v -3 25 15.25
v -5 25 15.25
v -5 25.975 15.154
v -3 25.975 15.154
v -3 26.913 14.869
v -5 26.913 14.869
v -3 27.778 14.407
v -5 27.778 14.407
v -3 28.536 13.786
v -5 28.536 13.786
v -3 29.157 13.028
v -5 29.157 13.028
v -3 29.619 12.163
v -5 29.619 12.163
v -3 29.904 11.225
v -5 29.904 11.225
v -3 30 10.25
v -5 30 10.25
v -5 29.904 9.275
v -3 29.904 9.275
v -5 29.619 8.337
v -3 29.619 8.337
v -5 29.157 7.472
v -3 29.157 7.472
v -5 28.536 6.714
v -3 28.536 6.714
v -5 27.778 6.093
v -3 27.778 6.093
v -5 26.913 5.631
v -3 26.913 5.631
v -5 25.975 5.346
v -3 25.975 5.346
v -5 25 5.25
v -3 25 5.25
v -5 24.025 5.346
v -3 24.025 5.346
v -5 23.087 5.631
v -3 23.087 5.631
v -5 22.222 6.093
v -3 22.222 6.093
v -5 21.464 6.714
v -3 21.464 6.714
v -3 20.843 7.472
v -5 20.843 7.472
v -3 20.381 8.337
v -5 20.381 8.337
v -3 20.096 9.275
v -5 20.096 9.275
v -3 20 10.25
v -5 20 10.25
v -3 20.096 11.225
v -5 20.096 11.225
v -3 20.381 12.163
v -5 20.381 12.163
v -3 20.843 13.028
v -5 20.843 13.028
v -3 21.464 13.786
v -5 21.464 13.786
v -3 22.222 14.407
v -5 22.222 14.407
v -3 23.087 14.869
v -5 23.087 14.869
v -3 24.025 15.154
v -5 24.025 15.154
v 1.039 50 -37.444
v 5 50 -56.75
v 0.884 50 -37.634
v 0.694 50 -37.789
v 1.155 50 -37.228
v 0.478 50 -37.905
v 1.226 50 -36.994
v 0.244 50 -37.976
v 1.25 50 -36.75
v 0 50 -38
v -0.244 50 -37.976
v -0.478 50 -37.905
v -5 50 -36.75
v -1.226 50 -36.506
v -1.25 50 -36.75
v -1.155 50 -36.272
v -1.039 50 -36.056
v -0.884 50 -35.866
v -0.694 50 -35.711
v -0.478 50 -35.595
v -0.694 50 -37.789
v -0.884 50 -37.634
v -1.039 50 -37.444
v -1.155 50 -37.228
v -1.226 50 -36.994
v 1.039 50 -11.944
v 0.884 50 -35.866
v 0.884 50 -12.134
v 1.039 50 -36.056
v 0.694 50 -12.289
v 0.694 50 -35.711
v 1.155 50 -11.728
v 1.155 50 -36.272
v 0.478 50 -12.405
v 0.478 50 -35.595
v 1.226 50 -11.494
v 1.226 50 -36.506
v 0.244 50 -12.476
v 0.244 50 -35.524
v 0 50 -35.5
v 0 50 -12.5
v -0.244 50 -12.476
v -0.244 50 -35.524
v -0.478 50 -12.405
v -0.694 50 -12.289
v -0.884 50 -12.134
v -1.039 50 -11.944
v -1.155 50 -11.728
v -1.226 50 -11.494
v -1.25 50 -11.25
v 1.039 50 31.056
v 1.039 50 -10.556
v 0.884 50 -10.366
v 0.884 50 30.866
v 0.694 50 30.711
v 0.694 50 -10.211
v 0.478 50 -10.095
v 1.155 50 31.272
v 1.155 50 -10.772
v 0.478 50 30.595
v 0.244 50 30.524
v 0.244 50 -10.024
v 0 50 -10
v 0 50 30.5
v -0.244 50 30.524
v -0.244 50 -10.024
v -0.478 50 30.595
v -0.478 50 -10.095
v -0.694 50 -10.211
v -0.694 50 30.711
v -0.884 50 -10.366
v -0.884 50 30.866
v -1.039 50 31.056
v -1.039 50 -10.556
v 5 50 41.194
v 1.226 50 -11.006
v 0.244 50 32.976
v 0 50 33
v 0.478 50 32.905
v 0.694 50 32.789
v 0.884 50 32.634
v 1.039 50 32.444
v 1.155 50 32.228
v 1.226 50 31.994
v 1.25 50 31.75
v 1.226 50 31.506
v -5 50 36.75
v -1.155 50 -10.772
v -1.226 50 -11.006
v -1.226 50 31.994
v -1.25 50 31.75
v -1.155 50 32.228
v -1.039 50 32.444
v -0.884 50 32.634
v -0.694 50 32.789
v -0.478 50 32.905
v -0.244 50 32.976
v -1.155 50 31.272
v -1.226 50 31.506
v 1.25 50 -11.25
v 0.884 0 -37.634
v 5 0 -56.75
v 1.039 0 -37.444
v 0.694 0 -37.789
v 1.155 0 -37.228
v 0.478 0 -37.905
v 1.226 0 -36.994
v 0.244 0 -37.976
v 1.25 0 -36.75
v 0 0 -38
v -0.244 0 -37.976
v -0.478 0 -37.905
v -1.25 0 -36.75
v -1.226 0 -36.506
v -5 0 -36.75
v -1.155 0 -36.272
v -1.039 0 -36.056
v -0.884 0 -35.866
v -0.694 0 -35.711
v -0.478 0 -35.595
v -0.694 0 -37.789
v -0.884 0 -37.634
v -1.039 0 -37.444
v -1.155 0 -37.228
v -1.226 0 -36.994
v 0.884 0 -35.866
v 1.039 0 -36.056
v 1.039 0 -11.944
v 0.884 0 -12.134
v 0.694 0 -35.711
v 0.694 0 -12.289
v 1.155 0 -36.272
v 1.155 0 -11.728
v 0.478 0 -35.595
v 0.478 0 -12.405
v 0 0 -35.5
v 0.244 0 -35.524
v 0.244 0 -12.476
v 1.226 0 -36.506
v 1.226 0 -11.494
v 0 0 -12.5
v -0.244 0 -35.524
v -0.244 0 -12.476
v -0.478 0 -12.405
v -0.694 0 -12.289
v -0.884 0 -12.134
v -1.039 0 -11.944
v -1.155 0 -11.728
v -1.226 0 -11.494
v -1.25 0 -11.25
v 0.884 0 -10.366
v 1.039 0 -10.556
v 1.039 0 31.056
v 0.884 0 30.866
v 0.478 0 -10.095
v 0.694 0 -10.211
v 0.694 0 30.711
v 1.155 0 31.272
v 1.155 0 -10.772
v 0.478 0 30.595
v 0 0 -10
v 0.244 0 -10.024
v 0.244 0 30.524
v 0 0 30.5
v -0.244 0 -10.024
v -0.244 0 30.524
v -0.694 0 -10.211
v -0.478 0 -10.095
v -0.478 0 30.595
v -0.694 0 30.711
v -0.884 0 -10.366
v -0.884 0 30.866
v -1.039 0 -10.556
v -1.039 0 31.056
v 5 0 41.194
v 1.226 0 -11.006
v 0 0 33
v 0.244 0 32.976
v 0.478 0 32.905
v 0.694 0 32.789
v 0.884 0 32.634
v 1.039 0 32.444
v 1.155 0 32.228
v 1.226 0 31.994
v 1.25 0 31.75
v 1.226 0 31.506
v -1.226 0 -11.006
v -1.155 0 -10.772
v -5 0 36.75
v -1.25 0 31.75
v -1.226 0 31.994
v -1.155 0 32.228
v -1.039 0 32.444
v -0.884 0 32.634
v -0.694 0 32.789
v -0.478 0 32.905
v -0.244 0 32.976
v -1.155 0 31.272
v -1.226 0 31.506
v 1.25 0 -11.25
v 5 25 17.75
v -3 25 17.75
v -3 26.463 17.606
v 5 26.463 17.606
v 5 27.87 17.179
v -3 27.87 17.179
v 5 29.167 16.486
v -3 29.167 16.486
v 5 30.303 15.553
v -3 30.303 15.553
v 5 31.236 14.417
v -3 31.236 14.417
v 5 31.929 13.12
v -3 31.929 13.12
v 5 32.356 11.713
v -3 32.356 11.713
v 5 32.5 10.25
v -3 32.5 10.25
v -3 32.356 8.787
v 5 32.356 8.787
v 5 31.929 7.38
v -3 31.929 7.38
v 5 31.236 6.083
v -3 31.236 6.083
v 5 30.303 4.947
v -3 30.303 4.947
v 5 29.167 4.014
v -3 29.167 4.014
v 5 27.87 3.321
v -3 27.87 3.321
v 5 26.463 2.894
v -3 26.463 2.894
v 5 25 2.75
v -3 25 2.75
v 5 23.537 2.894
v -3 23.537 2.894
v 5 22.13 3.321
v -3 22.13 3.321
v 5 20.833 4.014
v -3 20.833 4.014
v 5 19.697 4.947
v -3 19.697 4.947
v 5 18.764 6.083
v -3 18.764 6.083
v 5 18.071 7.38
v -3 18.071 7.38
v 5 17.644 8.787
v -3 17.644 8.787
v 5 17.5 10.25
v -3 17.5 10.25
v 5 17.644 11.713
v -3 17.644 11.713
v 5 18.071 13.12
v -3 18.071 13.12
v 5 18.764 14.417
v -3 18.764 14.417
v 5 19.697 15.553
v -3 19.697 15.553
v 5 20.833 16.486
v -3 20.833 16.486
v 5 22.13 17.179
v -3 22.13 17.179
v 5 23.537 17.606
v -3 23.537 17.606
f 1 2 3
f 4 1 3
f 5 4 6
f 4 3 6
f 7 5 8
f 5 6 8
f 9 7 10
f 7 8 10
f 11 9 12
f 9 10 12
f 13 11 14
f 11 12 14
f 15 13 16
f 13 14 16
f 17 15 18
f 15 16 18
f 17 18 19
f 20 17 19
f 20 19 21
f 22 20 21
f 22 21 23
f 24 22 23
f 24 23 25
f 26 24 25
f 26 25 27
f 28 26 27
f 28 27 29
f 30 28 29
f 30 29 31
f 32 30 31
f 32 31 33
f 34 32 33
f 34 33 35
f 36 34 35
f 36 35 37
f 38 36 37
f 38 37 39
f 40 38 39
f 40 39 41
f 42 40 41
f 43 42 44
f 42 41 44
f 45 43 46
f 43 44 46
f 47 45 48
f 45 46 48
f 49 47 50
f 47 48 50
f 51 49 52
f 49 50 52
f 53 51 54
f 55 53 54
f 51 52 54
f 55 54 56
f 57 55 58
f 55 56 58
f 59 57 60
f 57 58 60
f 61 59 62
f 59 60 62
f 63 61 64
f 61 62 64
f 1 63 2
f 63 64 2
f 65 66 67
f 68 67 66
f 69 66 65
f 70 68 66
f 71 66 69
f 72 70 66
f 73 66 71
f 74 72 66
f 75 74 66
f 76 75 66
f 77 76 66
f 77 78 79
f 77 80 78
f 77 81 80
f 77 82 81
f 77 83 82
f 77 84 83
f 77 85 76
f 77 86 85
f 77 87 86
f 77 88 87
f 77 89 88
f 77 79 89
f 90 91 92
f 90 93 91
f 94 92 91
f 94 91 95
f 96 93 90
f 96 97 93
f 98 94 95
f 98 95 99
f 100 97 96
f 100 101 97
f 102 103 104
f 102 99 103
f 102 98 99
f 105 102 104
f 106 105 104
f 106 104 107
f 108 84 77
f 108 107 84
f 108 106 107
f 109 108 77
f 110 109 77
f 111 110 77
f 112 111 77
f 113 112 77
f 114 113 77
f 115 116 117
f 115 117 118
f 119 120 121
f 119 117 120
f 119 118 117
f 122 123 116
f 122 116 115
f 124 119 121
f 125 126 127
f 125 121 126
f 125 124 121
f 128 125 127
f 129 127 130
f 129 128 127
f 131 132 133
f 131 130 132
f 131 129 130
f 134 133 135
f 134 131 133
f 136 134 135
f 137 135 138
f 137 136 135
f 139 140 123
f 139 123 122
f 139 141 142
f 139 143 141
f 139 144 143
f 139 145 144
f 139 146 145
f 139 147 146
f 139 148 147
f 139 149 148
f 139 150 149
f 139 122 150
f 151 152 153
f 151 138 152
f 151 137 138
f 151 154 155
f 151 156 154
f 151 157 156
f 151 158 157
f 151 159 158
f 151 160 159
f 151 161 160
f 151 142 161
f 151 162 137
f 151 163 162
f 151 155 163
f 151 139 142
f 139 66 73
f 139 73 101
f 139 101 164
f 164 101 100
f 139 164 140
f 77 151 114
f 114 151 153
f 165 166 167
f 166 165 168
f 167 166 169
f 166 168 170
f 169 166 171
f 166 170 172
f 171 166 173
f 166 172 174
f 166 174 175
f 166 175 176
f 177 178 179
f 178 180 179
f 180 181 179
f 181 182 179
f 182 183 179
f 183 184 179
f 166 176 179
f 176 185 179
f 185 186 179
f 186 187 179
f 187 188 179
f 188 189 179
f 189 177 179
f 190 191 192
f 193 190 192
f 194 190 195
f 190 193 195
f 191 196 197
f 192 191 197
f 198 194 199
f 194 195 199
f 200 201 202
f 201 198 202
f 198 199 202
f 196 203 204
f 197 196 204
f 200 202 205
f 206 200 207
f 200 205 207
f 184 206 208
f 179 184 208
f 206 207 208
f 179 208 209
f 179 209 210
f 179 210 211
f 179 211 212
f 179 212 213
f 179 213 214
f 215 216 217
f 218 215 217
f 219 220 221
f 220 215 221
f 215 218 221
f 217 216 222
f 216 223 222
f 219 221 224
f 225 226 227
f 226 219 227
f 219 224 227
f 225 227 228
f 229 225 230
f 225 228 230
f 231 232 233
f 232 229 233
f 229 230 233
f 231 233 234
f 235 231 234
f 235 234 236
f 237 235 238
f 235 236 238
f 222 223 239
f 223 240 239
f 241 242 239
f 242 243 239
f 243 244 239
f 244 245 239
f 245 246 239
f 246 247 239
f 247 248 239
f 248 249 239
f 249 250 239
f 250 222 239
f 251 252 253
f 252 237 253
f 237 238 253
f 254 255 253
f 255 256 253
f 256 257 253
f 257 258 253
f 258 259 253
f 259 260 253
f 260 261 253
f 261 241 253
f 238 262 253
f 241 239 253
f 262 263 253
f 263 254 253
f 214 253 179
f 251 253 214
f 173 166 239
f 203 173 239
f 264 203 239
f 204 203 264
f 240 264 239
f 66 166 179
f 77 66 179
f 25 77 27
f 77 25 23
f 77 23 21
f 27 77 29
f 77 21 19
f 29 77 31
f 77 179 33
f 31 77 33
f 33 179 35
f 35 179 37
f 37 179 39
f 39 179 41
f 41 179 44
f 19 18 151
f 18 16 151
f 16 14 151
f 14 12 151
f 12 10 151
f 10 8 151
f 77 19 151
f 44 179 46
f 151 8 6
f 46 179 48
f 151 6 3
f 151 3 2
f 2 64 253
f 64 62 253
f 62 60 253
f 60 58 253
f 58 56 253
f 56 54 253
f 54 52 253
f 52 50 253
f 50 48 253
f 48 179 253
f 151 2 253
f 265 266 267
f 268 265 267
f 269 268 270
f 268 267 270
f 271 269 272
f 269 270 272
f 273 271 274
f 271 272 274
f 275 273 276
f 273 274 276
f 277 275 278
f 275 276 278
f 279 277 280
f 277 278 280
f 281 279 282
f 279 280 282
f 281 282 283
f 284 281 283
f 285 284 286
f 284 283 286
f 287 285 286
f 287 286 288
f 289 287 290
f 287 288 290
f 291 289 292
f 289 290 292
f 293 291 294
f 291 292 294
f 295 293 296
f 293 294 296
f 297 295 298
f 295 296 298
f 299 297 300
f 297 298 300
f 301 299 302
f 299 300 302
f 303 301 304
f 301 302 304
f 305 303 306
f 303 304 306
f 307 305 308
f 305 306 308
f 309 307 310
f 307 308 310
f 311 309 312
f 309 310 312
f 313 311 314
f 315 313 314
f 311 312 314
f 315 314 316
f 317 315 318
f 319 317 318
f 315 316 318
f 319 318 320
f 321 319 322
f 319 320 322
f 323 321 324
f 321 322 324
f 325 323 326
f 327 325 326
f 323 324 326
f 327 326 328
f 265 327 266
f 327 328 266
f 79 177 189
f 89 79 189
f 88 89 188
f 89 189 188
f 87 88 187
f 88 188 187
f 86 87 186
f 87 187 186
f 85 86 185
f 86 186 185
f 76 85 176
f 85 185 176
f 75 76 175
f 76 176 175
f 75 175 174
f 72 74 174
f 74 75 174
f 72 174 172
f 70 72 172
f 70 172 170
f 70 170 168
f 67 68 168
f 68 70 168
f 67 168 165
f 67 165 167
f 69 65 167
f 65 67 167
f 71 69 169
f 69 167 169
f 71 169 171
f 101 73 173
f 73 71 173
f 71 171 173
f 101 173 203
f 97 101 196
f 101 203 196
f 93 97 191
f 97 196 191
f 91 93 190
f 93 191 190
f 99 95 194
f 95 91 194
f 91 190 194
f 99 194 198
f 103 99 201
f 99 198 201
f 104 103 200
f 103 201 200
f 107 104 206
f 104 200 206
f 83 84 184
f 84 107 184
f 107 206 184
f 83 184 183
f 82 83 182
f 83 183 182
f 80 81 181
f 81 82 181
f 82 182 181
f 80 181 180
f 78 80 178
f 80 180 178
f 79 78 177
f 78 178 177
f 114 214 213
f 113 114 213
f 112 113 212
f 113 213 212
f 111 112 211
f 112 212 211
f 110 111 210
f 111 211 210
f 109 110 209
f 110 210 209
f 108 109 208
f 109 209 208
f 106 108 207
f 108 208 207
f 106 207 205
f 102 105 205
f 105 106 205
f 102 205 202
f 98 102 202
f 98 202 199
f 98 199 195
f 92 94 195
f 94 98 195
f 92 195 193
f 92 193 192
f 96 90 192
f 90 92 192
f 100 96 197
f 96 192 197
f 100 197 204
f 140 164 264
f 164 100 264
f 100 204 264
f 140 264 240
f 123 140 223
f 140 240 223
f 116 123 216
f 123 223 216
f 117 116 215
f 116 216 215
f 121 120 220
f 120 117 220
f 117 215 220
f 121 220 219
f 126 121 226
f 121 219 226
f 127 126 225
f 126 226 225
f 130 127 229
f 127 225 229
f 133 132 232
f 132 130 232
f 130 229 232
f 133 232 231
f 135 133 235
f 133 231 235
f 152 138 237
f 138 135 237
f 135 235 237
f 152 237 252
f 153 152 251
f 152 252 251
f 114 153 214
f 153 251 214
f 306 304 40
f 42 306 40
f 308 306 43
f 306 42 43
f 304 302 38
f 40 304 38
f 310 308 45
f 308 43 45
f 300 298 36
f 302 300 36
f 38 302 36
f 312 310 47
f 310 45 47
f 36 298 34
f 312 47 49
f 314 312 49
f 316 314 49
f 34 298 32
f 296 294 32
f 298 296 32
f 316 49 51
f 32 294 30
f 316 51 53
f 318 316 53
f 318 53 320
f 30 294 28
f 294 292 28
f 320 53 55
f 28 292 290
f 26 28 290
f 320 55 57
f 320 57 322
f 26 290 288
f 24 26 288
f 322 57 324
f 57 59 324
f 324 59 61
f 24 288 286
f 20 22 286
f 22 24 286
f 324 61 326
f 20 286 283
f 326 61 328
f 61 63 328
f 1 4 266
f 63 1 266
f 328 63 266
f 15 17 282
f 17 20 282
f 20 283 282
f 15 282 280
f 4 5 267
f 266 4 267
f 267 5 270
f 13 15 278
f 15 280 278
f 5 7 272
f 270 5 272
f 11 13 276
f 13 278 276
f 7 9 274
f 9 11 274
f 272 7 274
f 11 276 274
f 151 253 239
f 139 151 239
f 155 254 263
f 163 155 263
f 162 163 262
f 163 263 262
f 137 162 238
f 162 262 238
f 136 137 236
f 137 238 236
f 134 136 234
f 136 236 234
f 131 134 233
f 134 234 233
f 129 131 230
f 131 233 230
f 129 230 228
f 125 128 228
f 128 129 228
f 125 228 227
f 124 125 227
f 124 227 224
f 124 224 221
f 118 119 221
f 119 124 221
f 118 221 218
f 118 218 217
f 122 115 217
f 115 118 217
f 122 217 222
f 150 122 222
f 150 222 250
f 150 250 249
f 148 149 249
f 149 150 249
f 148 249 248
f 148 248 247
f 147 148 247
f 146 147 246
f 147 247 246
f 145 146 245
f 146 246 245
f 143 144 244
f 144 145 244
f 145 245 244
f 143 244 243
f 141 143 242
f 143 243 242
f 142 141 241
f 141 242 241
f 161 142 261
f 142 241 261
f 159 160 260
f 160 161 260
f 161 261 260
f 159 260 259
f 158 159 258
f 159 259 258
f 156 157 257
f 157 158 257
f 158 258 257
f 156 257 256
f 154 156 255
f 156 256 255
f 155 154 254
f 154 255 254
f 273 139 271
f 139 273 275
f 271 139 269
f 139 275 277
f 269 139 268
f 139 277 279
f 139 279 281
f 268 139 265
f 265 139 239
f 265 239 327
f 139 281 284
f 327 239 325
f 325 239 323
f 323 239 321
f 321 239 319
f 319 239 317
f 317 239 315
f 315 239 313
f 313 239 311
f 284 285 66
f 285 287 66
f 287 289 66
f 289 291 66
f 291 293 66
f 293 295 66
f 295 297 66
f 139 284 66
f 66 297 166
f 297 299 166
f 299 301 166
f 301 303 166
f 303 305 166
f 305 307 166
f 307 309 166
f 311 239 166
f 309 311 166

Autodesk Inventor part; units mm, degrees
ref_plane "YZ Plane" through (0, 0, 0) normal (1, 0, 0) x (0, 1, 0)
ref_plane "XZ Plane" through (0, 0, 0) normal (0, 1, 0) x (-1, 0, 0)
sketch "Sketch1" plane through (0, 0, 0) normal (0, 1, 0) x (-1, 0, 0)
  line L0 (5, -36.75) -> (5, 36.75)
  line L1 (-5, 36.75) -> (-5, -36.75)
  line L2 (-5, 36.75) -> (-5, 41.1944)
  line L3 (5, 36.75) -> (-5, 41.1944)
  line L4 (-5, -36.75) -> (-5, -56.75)
  line L5 (-5, -56.75) -> (5, -36.75)
  line L6 (5, 11.25) -> (5, -36.75)
  line L7 (5, -31.75) -> (5, -36.75)
  line L8 (5, 31.75) -> (5, 36.75)
  circle A0 centre (0, 31.75) radius 1.25
  circle A1 centre (0, -36.75) radius 1.25
  circle A2 centre (0, -11.25) radius 1.25
  point P0 (0, 0)
  dimension "d3" = 10
  dimension "d4" = 73.5
  dimension "d6" = 4.4444
  dimension "d8" = 20
  dimension "d17" = 2.5
  dimension "d26" = 2.5
  dimension "d28" = 2.5
ref_plane "Work Plane1" through (-5, 0, -36.75) normal (-1, 0, 0) x (0, 0, 1)
extrude "Extrusion3" add sketch "Sketch1" along normal blind 50
sketch "Sketch3" plane through (-5, 0, -36.75) normal (-1, 0, 0) x (0, 0, 1)
  line L0 (73.5, 50) -> (47, 50)
  line L1 (47, 50) -> (47, 25)
  line L2 (47, 25) -> (73.5, 25)
  line L3 (73.5, 25) -> (73.5, 50)
  circle A0 centre (47, 25) radius 7.5
  circle A1 centre (47, 25) radius 5
  point P0 (36.75, 0)
  dimension "d37" = 26.5
  dimension "d38" = 25
  dimension "d39" = 15
  dimension "d42" = 10
extrude "Extrusion6" cut sketch "Sketch3" against normal blind 10 contours A0 L2 A1 L1 | L1 A1 L2 A0 | A1 L2 L1 | L1 L2 A1
extrude "Extrusion7" add sketch "Sketch3" against normal blind 2 contours A0 L2 A1 L1 | L1 A1 L2 A0
properties part number "bocnice_delsi"
